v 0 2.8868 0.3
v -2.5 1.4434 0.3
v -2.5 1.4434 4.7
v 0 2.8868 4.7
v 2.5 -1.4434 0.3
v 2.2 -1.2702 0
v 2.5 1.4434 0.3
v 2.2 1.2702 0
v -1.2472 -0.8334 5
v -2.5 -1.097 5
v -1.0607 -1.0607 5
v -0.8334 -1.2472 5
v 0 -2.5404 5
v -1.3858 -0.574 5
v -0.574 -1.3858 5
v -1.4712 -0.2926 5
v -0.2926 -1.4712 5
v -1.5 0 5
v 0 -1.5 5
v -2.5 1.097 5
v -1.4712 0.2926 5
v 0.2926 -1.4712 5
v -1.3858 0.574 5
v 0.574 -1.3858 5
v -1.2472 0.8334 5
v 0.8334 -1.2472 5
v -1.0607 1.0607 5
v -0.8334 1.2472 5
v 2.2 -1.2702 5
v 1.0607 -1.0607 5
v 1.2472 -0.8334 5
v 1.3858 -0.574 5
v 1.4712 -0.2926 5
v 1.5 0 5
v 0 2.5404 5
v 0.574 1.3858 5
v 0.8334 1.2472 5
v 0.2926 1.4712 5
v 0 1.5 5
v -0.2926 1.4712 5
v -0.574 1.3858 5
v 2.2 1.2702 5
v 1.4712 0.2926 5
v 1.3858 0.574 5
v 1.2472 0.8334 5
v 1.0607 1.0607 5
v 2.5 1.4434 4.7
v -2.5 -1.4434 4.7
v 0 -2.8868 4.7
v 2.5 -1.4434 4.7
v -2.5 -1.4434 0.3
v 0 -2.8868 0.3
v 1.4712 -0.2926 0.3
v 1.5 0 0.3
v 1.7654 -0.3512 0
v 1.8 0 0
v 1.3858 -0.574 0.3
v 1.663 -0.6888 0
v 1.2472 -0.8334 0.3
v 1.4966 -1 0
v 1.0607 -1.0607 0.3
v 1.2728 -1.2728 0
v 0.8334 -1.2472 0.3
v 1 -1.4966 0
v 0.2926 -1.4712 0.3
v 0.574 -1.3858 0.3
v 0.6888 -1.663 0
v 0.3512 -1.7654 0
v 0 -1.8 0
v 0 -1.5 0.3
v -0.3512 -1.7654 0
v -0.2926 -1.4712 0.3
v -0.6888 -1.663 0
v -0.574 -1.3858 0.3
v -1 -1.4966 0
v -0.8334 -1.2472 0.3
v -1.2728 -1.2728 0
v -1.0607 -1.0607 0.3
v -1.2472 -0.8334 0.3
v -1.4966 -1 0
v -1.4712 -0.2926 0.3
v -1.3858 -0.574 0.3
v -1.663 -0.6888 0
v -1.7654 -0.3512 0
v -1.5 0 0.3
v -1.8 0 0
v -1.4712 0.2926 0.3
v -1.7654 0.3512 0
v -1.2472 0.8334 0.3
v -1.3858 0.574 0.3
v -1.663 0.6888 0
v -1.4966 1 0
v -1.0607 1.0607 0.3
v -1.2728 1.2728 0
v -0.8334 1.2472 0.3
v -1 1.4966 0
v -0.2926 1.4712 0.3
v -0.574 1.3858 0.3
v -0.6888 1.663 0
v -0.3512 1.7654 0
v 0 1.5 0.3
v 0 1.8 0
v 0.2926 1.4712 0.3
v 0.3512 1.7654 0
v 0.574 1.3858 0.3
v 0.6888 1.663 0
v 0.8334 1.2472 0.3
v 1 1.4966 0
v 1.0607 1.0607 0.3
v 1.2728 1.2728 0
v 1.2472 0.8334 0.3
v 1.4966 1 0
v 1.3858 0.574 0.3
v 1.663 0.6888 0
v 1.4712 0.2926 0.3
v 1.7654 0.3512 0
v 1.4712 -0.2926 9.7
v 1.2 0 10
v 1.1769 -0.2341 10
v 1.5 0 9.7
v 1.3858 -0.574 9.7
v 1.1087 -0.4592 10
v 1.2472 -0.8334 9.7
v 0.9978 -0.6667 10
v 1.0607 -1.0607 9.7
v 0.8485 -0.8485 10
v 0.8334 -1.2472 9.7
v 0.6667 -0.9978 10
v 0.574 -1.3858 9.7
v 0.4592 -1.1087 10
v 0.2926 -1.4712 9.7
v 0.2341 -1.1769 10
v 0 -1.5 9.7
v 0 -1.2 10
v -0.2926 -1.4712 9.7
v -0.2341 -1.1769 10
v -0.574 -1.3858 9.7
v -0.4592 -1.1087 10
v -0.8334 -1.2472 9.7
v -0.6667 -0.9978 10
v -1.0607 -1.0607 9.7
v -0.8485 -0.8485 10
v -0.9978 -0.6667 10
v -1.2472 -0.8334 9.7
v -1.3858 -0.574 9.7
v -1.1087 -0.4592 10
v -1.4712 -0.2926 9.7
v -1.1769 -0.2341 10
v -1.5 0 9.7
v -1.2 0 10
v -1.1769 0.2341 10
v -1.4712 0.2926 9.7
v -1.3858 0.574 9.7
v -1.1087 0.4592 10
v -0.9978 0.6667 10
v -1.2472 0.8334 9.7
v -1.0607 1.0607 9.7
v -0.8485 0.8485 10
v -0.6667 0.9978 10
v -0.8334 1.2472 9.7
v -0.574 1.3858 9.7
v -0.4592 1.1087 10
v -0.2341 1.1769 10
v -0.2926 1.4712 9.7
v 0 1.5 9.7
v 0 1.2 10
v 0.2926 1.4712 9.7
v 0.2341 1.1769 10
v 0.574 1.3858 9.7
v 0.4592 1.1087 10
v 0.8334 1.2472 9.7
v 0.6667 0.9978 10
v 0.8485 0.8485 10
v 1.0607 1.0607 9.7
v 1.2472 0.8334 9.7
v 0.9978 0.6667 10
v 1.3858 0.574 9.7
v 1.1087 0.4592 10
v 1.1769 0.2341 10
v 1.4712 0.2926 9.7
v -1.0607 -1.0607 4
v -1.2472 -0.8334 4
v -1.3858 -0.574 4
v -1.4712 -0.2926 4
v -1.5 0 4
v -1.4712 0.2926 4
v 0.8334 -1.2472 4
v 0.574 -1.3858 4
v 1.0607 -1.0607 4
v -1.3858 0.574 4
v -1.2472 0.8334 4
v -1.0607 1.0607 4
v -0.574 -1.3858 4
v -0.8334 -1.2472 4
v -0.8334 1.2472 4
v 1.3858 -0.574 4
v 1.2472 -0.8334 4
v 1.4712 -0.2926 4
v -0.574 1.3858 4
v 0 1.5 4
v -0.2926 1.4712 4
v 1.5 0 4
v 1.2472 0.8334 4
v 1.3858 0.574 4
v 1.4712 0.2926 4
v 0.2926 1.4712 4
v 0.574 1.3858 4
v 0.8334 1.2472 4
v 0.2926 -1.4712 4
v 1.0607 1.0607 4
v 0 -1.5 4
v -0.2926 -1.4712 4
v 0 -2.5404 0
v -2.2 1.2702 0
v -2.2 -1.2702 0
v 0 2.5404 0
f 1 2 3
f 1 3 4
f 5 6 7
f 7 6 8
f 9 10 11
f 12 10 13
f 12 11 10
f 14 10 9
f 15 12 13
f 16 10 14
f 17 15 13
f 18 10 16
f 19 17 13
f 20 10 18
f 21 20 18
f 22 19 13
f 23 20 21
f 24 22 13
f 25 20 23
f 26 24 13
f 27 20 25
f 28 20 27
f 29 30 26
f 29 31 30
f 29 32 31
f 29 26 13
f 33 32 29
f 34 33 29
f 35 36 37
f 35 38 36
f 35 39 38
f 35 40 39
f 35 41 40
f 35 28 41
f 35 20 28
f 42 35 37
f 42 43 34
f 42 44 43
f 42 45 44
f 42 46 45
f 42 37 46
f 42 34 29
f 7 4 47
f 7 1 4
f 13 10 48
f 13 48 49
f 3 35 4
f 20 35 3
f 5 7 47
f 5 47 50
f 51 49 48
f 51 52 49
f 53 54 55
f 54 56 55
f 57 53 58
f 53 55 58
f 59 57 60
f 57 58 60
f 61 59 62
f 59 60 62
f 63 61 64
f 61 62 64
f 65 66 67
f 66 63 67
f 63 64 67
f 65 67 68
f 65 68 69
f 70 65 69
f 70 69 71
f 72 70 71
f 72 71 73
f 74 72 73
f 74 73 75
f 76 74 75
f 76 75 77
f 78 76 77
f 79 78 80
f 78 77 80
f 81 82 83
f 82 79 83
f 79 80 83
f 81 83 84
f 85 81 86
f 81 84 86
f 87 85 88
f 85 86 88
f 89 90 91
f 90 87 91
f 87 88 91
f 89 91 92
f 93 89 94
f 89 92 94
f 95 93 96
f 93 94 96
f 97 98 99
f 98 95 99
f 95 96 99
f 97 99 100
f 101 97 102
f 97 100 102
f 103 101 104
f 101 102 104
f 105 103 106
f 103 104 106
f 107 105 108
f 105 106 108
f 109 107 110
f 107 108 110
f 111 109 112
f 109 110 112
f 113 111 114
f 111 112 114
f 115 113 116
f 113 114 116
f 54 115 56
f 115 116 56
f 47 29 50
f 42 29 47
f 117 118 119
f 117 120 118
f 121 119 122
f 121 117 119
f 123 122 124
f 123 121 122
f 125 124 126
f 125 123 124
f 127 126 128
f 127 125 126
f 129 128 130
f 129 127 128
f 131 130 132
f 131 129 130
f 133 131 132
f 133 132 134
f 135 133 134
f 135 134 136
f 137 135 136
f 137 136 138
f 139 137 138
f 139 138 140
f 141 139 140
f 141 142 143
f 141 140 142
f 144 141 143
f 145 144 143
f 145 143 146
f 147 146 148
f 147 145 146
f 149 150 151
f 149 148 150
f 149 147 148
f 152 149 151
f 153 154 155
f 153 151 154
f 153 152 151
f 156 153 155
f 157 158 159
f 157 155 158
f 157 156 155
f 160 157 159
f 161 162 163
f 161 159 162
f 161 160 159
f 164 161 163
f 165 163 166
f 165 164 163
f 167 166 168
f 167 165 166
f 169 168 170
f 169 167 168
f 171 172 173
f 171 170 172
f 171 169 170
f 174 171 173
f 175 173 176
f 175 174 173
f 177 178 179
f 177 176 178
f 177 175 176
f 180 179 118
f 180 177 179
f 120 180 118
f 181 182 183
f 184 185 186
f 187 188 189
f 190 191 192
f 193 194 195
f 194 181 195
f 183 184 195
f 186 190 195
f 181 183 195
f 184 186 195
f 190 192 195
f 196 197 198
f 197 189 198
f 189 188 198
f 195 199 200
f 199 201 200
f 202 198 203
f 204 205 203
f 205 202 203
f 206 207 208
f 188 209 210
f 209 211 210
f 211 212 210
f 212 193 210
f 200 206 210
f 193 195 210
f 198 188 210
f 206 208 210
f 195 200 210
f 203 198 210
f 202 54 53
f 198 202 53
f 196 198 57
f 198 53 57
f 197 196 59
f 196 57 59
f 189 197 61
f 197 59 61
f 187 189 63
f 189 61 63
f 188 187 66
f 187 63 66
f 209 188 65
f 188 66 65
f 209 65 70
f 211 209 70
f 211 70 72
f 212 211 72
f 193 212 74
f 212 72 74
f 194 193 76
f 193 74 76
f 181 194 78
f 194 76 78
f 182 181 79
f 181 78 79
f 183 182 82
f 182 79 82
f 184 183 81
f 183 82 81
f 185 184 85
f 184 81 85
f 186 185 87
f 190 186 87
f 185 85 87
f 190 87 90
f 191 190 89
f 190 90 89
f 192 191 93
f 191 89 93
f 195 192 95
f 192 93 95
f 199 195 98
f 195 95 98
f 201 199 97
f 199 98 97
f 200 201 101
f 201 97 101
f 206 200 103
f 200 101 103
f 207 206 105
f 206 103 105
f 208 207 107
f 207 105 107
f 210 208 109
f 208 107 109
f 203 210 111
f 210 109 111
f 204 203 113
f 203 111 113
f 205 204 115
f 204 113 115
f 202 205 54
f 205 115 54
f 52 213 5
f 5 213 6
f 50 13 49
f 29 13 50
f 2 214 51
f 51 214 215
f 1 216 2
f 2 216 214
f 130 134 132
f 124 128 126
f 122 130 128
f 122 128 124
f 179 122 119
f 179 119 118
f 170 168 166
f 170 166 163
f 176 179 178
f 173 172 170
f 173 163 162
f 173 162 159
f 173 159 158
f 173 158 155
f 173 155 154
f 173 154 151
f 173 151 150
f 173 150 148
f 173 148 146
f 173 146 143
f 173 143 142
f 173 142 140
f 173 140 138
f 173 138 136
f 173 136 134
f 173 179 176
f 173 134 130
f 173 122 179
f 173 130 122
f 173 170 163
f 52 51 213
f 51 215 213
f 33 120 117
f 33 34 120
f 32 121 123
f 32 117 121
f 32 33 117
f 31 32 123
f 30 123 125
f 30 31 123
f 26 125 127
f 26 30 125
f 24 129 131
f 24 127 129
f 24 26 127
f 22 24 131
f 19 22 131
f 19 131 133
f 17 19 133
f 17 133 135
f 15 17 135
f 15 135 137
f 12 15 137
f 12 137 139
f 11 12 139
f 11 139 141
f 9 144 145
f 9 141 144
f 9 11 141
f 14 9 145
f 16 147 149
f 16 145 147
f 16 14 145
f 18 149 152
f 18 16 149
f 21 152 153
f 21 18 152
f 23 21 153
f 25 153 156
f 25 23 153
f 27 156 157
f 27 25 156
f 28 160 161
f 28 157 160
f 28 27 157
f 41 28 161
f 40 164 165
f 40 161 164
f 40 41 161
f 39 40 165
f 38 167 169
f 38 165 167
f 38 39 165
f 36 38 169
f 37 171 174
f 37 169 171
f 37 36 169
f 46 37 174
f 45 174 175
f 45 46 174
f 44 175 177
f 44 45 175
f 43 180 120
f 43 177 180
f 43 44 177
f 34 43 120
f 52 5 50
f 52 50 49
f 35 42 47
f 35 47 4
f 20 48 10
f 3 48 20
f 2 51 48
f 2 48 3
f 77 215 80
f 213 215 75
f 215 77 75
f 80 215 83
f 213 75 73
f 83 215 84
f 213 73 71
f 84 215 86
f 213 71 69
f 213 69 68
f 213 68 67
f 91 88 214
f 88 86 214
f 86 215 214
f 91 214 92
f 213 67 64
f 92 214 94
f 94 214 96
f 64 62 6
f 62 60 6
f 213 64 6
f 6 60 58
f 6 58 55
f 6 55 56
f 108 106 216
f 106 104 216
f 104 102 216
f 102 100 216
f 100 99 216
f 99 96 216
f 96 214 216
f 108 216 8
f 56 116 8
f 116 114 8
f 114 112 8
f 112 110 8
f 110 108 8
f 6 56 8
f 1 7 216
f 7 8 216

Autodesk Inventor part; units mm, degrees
ref_plane "YZ Plane" through (0, 0, 0) normal (1, 0, 0) x (0, 1, 0)
ref_plane "XZ Plane" through (0, 0, 0) normal (0, 1, 0) x (-1, 0, 0)
ref_plane "XY Plane" through (0, 0, 0) normal (0, 0, 1) x (1, 0, 0)
sketch "Skizze1" plane through (0, 0, 0) normal (0, 0, 1) x (1, 0, 0)
  line L0 (0, 2.8868) -> (2.5, 1.4434)
  line L1 (2.5, 1.4434) -> (2.5, -1.4434)
  line L2 (2.5, -1.4434) -> (0, -2.8868)
  line L3 (0, -2.8868) -> (-2.5, -1.4434)
  line L4 (-2.5, -1.4434) -> (-2.5, 1.4434)
  line L5 (-2.5, 1.4434) -> (0, 2.8868)
  circle A0 centre (0, 0) radius 1.5
  dimension "d0" = 5
  dimension "d1" = 3
extrude "Extrusion1" add sketch "Skizze1" along normal blind 5
chamfer "Fase1" distance 0.3 angle 45 13 edges at (1.25, -2.1651, 5) (-1.25, -2.1651, 5) (2.5, 0, 5) (1.25, 2.1651, 5) (-1.25, 2.1651, 5) (1.25, -2.1651, 0) (2.5, 0, 0) (-1.25, -2.1651, 0) (1.25, 2.1651, 0) (-1.25, 2.1651, 0) (-2.5, 0, 0) (-1.5, 0, 5) (-1.5, 0, 0)
thread "Gewinde1" size "M3x0.5" class "6H" standard "ANSI Metric M Profile" full length
sketch "Skizze2" plane through (0, 0, 5) normal (0, 0, 1) x (1, 0, 0)
  line L0 (0, -2.5403) -> (-2.5, -1.097) projected
  line L1 (2.2, -1.2702) -> (0, -2.5403) projected
  line L2 (2.2, 1.2702) -> (2.2, -1.2702) projected
  line L3 (0, 2.5403) -> (2.2, 1.2702) projected
  line L4 (-2.5, 1.097) -> (0, 2.5403) projected
  line L5 (-2.5, 1.097) -> (-2.5, -1.097) projected
  circle A0 centre (0, 0) radius 1.8 projected
extrude "Extrusion2" add sketch "Skizze2" against normal blind 1 contours A0
sketch "Skizze3" plane through (0, 0, 5) normal (0, 0, 1) x (1, 0, 0)
  circle A0 centre (0, 0) radius 1.5
  dimension "d11" = 3
extrude "Extrusion3" add sketch "Skizze3" along normal blind 5
thread "Gewinde2" size "M3x0.5" class "6g" standard "ANSI Metric M Profile" full length
chamfer "Fase2" distance 0.3 angle 45 1 edges at (-1.5, 0, 10)
properties part number "Distanzhuelse_M3x5mm_" material "Nickel-Kupfer-Legierung 400"
